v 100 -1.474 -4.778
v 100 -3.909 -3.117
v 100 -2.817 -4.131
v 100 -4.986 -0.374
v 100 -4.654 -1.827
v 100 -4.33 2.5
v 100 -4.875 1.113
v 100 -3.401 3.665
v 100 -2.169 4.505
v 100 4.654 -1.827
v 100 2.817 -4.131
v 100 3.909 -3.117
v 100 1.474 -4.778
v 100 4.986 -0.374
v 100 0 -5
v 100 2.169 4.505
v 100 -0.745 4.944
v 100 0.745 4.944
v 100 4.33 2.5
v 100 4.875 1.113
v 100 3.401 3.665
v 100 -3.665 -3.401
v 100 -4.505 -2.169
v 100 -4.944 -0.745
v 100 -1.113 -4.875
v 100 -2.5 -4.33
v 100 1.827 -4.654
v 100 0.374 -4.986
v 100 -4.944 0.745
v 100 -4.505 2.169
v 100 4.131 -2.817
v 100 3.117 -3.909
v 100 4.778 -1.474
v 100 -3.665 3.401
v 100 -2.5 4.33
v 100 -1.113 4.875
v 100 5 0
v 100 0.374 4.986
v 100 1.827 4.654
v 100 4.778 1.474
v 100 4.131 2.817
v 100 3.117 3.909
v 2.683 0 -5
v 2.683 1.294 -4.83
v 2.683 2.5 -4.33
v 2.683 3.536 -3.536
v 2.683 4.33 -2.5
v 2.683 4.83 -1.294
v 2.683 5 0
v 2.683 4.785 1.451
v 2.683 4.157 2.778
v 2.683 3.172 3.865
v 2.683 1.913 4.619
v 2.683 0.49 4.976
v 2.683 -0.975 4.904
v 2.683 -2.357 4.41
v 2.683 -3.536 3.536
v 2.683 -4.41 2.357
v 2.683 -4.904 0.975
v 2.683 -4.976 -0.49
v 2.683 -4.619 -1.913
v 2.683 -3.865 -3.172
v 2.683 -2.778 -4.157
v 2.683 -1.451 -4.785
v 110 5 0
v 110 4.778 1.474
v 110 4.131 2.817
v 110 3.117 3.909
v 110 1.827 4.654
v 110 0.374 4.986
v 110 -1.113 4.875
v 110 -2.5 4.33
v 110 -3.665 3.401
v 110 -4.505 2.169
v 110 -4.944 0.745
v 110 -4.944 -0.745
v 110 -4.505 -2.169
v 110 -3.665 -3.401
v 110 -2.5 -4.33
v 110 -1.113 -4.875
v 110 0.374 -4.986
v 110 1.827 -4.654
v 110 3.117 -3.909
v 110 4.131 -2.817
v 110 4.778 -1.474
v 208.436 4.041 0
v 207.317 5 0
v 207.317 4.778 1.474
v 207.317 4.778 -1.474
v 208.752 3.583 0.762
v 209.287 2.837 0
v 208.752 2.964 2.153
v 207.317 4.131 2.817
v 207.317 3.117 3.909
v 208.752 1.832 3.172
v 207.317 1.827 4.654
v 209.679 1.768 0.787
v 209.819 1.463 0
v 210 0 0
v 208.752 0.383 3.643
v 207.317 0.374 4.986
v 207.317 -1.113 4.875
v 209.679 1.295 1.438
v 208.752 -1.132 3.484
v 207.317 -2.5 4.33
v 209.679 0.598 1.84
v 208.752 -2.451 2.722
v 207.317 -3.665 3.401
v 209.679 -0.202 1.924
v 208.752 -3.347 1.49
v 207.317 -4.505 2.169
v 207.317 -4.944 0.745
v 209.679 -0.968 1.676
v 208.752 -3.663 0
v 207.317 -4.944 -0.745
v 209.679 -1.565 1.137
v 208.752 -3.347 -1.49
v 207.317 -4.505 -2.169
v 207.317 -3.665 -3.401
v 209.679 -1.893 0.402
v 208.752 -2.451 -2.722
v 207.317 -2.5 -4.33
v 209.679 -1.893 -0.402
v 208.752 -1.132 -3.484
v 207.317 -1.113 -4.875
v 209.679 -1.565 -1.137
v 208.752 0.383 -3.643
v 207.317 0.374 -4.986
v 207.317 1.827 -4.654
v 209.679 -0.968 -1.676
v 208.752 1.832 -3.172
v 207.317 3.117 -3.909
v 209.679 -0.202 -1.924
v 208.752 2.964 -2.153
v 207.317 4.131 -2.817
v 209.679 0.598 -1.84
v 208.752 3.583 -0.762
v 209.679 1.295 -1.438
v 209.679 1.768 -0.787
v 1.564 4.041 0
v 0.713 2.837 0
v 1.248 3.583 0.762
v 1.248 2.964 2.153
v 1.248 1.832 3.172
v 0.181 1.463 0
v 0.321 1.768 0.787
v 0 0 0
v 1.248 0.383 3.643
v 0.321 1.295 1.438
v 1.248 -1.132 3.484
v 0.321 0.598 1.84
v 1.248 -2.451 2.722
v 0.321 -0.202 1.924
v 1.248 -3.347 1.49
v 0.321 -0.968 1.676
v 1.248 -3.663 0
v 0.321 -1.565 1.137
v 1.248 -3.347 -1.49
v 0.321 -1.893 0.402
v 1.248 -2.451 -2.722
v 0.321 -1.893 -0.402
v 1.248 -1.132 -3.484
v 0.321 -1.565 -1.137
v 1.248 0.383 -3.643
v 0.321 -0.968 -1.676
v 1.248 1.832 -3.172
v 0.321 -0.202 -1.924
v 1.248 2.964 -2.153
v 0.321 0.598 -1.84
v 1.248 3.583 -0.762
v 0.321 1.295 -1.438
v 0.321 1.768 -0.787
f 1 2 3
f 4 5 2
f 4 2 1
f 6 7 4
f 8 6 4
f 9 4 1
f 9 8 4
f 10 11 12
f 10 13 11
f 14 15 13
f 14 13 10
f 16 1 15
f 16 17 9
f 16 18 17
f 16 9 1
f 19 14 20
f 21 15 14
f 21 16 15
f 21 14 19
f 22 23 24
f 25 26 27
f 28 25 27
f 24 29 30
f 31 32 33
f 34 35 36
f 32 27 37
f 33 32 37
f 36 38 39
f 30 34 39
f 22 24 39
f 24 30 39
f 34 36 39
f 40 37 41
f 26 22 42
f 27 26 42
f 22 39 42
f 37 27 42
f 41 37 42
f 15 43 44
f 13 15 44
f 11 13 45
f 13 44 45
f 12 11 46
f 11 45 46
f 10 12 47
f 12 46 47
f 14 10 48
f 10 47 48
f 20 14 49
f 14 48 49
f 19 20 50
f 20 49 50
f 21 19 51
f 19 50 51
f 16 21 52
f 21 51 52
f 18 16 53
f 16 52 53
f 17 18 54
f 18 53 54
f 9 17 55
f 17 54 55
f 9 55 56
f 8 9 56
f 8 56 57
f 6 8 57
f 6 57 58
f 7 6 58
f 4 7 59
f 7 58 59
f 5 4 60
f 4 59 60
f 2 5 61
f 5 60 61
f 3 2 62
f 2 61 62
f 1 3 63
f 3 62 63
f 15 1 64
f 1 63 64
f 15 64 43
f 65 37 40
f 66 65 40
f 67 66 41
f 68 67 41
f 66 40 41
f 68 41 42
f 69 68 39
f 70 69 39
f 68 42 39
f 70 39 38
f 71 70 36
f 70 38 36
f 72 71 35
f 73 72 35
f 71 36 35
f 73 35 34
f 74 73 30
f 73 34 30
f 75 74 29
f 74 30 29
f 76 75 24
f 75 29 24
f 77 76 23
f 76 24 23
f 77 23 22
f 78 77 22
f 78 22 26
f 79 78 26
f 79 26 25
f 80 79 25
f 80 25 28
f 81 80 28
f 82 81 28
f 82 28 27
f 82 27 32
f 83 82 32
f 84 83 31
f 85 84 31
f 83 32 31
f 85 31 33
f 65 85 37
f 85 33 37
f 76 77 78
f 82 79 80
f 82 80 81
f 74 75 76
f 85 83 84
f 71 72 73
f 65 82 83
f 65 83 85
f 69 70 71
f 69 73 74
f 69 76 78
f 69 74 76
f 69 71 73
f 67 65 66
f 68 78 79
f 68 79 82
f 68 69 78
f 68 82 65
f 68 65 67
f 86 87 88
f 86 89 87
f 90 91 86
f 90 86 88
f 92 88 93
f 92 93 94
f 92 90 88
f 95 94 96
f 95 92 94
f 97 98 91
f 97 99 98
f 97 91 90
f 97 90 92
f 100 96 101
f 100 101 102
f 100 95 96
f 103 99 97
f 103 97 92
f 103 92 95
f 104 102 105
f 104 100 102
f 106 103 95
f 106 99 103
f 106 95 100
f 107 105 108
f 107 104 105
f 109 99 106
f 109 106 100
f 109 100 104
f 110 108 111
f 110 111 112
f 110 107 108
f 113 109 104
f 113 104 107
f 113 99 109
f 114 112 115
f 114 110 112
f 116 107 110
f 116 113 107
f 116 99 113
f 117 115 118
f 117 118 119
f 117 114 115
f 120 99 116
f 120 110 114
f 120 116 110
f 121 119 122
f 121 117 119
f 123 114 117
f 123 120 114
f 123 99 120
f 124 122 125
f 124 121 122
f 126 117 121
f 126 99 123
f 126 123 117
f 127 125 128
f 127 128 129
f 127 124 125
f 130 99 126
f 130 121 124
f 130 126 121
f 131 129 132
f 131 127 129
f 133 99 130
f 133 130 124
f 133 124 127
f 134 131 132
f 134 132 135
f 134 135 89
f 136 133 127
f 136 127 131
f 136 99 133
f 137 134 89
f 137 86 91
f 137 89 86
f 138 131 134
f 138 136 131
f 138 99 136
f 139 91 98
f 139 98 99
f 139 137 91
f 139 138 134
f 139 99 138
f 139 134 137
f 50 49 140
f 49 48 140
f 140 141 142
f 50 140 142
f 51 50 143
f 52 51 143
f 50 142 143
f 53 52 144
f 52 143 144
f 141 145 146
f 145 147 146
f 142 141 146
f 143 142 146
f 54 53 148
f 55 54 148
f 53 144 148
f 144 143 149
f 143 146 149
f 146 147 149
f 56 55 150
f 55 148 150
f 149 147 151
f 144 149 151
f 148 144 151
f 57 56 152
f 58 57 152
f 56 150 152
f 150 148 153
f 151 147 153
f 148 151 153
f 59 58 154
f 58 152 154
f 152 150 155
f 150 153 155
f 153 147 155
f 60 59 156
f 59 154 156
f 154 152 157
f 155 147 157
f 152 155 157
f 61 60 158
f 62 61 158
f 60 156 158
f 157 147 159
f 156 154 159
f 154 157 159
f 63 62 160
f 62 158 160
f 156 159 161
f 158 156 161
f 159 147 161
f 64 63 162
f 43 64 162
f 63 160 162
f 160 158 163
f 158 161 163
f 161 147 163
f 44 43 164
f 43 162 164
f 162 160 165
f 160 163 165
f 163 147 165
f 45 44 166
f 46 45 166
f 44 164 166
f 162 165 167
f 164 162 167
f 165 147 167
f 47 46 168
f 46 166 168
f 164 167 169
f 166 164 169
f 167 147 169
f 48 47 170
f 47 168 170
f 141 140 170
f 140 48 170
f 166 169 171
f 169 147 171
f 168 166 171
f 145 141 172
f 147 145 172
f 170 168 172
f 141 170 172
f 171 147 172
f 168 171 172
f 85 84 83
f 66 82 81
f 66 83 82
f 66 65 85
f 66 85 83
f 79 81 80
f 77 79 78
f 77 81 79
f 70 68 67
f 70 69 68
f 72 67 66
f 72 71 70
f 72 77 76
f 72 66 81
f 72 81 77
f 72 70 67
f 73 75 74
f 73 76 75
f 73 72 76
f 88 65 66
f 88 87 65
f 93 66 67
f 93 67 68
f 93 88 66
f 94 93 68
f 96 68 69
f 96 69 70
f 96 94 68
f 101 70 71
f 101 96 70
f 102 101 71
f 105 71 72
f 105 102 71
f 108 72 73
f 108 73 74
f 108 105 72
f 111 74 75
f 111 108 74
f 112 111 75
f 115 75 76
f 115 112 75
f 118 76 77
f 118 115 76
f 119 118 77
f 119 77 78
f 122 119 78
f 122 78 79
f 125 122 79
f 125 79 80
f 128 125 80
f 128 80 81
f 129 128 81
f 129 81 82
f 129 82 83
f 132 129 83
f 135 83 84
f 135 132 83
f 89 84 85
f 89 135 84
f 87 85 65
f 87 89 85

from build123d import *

# Parameters (mm, degrees)
SKETCH1_R           = 5
BOSS_EXTRUDE1_DEPTH = 210
SPLIT6_START        = 100
SPLIT6_OUTLINE_R    = 5
SPLIT6_DEPTH        = 110
SPLIT6_3_OUTLINE_R  = 5
SPLIT6_3_DEPTH      = 10


# Read off the part's stored shape, not the designer's step: Split3, Split6
with BuildPart() as part:
    # Sketch1 → Boss-Extrude1 (new body)
    with BuildSketch(Plane(origin=(0, 0, 0), x_dir=(0, 0, -1), z_dir=(1, 0, 0))):
        Circle(SKETCH1_R)
    extrude(amount=BOSS_EXTRUDE1_DEPTH)

    # Split3 outline → Split3 (revolve, cut)
    with BuildSketch(Plane.YX):
        with BuildLine():
            ThreePointArc((5.000000003, 2.683375215), (2.837274334, 0.713235928), (0, 0))
            Line((0, 0), (5, 0))
            Line((5, 0), (5.000000003, 2.683375215))
        make_face()
    revolve(axis=Axis((0, 0, 0), (1, 0, 0)), mode=Mode.SUBTRACT)

    # SurfaceCut2: cut with a surface, the side behind it stays
    # Surface-Revolve4: a surface, the sketch's curves turned about an axis
    with BuildLine(Plane.XY, mode=Mode.PRIVATE) as surface_revolve4_1_path:
        ThreePointArc((210, 0), (209.286764074, 2.837274331), (207.31662479, 5))
    surface_revolve4_1 = Shell.revolve(surface_revolve4_1_path.wire(), 360, Axis((220.5, 0, 0), (-1, 0, 0)))
    split(bisect_by=surface_revolve4_1, keep=Keep.BOTTOM)

    # Split6 outline → Split6 (cut)
    with BuildSketch(Plane.YZ.offset(SPLIT6_START)):
        Circle(SPLIT6_OUTLINE_R)
    extrude(amount=SPLIT6_DEPTH, mode=Mode.SUBTRACT)


with BuildPart() as body_2:
    # Split6 2 outline → Split6 2 (revolve)
    with BuildSketch(Plane.YX):
        with BuildLine():
            Line((0, 210), (0, 110))
            Line((0, 110), (5, 110))
            Line((5, 110), (5.000000003, 207.316624785))
            ThreePointArc((5.000000003, 207.316624785), (2.837274334, 209.286764072), (0, 210))
        make_face()
    revolve(axis=Axis((0, 0, 0), (1, 0, 0)))


with BuildPart() as body_3:
    # Split6 3 outline → Split6 3 (new body)
    with BuildSketch(Plane.YZ.offset(SPLIT6_START)):
        Circle(SPLIT6_3_OUTLINE_R)
    extrude(amount=SPLIT6_3_DEPTH)


solid = Compound([part.part, body_2.part, body_3.part])
